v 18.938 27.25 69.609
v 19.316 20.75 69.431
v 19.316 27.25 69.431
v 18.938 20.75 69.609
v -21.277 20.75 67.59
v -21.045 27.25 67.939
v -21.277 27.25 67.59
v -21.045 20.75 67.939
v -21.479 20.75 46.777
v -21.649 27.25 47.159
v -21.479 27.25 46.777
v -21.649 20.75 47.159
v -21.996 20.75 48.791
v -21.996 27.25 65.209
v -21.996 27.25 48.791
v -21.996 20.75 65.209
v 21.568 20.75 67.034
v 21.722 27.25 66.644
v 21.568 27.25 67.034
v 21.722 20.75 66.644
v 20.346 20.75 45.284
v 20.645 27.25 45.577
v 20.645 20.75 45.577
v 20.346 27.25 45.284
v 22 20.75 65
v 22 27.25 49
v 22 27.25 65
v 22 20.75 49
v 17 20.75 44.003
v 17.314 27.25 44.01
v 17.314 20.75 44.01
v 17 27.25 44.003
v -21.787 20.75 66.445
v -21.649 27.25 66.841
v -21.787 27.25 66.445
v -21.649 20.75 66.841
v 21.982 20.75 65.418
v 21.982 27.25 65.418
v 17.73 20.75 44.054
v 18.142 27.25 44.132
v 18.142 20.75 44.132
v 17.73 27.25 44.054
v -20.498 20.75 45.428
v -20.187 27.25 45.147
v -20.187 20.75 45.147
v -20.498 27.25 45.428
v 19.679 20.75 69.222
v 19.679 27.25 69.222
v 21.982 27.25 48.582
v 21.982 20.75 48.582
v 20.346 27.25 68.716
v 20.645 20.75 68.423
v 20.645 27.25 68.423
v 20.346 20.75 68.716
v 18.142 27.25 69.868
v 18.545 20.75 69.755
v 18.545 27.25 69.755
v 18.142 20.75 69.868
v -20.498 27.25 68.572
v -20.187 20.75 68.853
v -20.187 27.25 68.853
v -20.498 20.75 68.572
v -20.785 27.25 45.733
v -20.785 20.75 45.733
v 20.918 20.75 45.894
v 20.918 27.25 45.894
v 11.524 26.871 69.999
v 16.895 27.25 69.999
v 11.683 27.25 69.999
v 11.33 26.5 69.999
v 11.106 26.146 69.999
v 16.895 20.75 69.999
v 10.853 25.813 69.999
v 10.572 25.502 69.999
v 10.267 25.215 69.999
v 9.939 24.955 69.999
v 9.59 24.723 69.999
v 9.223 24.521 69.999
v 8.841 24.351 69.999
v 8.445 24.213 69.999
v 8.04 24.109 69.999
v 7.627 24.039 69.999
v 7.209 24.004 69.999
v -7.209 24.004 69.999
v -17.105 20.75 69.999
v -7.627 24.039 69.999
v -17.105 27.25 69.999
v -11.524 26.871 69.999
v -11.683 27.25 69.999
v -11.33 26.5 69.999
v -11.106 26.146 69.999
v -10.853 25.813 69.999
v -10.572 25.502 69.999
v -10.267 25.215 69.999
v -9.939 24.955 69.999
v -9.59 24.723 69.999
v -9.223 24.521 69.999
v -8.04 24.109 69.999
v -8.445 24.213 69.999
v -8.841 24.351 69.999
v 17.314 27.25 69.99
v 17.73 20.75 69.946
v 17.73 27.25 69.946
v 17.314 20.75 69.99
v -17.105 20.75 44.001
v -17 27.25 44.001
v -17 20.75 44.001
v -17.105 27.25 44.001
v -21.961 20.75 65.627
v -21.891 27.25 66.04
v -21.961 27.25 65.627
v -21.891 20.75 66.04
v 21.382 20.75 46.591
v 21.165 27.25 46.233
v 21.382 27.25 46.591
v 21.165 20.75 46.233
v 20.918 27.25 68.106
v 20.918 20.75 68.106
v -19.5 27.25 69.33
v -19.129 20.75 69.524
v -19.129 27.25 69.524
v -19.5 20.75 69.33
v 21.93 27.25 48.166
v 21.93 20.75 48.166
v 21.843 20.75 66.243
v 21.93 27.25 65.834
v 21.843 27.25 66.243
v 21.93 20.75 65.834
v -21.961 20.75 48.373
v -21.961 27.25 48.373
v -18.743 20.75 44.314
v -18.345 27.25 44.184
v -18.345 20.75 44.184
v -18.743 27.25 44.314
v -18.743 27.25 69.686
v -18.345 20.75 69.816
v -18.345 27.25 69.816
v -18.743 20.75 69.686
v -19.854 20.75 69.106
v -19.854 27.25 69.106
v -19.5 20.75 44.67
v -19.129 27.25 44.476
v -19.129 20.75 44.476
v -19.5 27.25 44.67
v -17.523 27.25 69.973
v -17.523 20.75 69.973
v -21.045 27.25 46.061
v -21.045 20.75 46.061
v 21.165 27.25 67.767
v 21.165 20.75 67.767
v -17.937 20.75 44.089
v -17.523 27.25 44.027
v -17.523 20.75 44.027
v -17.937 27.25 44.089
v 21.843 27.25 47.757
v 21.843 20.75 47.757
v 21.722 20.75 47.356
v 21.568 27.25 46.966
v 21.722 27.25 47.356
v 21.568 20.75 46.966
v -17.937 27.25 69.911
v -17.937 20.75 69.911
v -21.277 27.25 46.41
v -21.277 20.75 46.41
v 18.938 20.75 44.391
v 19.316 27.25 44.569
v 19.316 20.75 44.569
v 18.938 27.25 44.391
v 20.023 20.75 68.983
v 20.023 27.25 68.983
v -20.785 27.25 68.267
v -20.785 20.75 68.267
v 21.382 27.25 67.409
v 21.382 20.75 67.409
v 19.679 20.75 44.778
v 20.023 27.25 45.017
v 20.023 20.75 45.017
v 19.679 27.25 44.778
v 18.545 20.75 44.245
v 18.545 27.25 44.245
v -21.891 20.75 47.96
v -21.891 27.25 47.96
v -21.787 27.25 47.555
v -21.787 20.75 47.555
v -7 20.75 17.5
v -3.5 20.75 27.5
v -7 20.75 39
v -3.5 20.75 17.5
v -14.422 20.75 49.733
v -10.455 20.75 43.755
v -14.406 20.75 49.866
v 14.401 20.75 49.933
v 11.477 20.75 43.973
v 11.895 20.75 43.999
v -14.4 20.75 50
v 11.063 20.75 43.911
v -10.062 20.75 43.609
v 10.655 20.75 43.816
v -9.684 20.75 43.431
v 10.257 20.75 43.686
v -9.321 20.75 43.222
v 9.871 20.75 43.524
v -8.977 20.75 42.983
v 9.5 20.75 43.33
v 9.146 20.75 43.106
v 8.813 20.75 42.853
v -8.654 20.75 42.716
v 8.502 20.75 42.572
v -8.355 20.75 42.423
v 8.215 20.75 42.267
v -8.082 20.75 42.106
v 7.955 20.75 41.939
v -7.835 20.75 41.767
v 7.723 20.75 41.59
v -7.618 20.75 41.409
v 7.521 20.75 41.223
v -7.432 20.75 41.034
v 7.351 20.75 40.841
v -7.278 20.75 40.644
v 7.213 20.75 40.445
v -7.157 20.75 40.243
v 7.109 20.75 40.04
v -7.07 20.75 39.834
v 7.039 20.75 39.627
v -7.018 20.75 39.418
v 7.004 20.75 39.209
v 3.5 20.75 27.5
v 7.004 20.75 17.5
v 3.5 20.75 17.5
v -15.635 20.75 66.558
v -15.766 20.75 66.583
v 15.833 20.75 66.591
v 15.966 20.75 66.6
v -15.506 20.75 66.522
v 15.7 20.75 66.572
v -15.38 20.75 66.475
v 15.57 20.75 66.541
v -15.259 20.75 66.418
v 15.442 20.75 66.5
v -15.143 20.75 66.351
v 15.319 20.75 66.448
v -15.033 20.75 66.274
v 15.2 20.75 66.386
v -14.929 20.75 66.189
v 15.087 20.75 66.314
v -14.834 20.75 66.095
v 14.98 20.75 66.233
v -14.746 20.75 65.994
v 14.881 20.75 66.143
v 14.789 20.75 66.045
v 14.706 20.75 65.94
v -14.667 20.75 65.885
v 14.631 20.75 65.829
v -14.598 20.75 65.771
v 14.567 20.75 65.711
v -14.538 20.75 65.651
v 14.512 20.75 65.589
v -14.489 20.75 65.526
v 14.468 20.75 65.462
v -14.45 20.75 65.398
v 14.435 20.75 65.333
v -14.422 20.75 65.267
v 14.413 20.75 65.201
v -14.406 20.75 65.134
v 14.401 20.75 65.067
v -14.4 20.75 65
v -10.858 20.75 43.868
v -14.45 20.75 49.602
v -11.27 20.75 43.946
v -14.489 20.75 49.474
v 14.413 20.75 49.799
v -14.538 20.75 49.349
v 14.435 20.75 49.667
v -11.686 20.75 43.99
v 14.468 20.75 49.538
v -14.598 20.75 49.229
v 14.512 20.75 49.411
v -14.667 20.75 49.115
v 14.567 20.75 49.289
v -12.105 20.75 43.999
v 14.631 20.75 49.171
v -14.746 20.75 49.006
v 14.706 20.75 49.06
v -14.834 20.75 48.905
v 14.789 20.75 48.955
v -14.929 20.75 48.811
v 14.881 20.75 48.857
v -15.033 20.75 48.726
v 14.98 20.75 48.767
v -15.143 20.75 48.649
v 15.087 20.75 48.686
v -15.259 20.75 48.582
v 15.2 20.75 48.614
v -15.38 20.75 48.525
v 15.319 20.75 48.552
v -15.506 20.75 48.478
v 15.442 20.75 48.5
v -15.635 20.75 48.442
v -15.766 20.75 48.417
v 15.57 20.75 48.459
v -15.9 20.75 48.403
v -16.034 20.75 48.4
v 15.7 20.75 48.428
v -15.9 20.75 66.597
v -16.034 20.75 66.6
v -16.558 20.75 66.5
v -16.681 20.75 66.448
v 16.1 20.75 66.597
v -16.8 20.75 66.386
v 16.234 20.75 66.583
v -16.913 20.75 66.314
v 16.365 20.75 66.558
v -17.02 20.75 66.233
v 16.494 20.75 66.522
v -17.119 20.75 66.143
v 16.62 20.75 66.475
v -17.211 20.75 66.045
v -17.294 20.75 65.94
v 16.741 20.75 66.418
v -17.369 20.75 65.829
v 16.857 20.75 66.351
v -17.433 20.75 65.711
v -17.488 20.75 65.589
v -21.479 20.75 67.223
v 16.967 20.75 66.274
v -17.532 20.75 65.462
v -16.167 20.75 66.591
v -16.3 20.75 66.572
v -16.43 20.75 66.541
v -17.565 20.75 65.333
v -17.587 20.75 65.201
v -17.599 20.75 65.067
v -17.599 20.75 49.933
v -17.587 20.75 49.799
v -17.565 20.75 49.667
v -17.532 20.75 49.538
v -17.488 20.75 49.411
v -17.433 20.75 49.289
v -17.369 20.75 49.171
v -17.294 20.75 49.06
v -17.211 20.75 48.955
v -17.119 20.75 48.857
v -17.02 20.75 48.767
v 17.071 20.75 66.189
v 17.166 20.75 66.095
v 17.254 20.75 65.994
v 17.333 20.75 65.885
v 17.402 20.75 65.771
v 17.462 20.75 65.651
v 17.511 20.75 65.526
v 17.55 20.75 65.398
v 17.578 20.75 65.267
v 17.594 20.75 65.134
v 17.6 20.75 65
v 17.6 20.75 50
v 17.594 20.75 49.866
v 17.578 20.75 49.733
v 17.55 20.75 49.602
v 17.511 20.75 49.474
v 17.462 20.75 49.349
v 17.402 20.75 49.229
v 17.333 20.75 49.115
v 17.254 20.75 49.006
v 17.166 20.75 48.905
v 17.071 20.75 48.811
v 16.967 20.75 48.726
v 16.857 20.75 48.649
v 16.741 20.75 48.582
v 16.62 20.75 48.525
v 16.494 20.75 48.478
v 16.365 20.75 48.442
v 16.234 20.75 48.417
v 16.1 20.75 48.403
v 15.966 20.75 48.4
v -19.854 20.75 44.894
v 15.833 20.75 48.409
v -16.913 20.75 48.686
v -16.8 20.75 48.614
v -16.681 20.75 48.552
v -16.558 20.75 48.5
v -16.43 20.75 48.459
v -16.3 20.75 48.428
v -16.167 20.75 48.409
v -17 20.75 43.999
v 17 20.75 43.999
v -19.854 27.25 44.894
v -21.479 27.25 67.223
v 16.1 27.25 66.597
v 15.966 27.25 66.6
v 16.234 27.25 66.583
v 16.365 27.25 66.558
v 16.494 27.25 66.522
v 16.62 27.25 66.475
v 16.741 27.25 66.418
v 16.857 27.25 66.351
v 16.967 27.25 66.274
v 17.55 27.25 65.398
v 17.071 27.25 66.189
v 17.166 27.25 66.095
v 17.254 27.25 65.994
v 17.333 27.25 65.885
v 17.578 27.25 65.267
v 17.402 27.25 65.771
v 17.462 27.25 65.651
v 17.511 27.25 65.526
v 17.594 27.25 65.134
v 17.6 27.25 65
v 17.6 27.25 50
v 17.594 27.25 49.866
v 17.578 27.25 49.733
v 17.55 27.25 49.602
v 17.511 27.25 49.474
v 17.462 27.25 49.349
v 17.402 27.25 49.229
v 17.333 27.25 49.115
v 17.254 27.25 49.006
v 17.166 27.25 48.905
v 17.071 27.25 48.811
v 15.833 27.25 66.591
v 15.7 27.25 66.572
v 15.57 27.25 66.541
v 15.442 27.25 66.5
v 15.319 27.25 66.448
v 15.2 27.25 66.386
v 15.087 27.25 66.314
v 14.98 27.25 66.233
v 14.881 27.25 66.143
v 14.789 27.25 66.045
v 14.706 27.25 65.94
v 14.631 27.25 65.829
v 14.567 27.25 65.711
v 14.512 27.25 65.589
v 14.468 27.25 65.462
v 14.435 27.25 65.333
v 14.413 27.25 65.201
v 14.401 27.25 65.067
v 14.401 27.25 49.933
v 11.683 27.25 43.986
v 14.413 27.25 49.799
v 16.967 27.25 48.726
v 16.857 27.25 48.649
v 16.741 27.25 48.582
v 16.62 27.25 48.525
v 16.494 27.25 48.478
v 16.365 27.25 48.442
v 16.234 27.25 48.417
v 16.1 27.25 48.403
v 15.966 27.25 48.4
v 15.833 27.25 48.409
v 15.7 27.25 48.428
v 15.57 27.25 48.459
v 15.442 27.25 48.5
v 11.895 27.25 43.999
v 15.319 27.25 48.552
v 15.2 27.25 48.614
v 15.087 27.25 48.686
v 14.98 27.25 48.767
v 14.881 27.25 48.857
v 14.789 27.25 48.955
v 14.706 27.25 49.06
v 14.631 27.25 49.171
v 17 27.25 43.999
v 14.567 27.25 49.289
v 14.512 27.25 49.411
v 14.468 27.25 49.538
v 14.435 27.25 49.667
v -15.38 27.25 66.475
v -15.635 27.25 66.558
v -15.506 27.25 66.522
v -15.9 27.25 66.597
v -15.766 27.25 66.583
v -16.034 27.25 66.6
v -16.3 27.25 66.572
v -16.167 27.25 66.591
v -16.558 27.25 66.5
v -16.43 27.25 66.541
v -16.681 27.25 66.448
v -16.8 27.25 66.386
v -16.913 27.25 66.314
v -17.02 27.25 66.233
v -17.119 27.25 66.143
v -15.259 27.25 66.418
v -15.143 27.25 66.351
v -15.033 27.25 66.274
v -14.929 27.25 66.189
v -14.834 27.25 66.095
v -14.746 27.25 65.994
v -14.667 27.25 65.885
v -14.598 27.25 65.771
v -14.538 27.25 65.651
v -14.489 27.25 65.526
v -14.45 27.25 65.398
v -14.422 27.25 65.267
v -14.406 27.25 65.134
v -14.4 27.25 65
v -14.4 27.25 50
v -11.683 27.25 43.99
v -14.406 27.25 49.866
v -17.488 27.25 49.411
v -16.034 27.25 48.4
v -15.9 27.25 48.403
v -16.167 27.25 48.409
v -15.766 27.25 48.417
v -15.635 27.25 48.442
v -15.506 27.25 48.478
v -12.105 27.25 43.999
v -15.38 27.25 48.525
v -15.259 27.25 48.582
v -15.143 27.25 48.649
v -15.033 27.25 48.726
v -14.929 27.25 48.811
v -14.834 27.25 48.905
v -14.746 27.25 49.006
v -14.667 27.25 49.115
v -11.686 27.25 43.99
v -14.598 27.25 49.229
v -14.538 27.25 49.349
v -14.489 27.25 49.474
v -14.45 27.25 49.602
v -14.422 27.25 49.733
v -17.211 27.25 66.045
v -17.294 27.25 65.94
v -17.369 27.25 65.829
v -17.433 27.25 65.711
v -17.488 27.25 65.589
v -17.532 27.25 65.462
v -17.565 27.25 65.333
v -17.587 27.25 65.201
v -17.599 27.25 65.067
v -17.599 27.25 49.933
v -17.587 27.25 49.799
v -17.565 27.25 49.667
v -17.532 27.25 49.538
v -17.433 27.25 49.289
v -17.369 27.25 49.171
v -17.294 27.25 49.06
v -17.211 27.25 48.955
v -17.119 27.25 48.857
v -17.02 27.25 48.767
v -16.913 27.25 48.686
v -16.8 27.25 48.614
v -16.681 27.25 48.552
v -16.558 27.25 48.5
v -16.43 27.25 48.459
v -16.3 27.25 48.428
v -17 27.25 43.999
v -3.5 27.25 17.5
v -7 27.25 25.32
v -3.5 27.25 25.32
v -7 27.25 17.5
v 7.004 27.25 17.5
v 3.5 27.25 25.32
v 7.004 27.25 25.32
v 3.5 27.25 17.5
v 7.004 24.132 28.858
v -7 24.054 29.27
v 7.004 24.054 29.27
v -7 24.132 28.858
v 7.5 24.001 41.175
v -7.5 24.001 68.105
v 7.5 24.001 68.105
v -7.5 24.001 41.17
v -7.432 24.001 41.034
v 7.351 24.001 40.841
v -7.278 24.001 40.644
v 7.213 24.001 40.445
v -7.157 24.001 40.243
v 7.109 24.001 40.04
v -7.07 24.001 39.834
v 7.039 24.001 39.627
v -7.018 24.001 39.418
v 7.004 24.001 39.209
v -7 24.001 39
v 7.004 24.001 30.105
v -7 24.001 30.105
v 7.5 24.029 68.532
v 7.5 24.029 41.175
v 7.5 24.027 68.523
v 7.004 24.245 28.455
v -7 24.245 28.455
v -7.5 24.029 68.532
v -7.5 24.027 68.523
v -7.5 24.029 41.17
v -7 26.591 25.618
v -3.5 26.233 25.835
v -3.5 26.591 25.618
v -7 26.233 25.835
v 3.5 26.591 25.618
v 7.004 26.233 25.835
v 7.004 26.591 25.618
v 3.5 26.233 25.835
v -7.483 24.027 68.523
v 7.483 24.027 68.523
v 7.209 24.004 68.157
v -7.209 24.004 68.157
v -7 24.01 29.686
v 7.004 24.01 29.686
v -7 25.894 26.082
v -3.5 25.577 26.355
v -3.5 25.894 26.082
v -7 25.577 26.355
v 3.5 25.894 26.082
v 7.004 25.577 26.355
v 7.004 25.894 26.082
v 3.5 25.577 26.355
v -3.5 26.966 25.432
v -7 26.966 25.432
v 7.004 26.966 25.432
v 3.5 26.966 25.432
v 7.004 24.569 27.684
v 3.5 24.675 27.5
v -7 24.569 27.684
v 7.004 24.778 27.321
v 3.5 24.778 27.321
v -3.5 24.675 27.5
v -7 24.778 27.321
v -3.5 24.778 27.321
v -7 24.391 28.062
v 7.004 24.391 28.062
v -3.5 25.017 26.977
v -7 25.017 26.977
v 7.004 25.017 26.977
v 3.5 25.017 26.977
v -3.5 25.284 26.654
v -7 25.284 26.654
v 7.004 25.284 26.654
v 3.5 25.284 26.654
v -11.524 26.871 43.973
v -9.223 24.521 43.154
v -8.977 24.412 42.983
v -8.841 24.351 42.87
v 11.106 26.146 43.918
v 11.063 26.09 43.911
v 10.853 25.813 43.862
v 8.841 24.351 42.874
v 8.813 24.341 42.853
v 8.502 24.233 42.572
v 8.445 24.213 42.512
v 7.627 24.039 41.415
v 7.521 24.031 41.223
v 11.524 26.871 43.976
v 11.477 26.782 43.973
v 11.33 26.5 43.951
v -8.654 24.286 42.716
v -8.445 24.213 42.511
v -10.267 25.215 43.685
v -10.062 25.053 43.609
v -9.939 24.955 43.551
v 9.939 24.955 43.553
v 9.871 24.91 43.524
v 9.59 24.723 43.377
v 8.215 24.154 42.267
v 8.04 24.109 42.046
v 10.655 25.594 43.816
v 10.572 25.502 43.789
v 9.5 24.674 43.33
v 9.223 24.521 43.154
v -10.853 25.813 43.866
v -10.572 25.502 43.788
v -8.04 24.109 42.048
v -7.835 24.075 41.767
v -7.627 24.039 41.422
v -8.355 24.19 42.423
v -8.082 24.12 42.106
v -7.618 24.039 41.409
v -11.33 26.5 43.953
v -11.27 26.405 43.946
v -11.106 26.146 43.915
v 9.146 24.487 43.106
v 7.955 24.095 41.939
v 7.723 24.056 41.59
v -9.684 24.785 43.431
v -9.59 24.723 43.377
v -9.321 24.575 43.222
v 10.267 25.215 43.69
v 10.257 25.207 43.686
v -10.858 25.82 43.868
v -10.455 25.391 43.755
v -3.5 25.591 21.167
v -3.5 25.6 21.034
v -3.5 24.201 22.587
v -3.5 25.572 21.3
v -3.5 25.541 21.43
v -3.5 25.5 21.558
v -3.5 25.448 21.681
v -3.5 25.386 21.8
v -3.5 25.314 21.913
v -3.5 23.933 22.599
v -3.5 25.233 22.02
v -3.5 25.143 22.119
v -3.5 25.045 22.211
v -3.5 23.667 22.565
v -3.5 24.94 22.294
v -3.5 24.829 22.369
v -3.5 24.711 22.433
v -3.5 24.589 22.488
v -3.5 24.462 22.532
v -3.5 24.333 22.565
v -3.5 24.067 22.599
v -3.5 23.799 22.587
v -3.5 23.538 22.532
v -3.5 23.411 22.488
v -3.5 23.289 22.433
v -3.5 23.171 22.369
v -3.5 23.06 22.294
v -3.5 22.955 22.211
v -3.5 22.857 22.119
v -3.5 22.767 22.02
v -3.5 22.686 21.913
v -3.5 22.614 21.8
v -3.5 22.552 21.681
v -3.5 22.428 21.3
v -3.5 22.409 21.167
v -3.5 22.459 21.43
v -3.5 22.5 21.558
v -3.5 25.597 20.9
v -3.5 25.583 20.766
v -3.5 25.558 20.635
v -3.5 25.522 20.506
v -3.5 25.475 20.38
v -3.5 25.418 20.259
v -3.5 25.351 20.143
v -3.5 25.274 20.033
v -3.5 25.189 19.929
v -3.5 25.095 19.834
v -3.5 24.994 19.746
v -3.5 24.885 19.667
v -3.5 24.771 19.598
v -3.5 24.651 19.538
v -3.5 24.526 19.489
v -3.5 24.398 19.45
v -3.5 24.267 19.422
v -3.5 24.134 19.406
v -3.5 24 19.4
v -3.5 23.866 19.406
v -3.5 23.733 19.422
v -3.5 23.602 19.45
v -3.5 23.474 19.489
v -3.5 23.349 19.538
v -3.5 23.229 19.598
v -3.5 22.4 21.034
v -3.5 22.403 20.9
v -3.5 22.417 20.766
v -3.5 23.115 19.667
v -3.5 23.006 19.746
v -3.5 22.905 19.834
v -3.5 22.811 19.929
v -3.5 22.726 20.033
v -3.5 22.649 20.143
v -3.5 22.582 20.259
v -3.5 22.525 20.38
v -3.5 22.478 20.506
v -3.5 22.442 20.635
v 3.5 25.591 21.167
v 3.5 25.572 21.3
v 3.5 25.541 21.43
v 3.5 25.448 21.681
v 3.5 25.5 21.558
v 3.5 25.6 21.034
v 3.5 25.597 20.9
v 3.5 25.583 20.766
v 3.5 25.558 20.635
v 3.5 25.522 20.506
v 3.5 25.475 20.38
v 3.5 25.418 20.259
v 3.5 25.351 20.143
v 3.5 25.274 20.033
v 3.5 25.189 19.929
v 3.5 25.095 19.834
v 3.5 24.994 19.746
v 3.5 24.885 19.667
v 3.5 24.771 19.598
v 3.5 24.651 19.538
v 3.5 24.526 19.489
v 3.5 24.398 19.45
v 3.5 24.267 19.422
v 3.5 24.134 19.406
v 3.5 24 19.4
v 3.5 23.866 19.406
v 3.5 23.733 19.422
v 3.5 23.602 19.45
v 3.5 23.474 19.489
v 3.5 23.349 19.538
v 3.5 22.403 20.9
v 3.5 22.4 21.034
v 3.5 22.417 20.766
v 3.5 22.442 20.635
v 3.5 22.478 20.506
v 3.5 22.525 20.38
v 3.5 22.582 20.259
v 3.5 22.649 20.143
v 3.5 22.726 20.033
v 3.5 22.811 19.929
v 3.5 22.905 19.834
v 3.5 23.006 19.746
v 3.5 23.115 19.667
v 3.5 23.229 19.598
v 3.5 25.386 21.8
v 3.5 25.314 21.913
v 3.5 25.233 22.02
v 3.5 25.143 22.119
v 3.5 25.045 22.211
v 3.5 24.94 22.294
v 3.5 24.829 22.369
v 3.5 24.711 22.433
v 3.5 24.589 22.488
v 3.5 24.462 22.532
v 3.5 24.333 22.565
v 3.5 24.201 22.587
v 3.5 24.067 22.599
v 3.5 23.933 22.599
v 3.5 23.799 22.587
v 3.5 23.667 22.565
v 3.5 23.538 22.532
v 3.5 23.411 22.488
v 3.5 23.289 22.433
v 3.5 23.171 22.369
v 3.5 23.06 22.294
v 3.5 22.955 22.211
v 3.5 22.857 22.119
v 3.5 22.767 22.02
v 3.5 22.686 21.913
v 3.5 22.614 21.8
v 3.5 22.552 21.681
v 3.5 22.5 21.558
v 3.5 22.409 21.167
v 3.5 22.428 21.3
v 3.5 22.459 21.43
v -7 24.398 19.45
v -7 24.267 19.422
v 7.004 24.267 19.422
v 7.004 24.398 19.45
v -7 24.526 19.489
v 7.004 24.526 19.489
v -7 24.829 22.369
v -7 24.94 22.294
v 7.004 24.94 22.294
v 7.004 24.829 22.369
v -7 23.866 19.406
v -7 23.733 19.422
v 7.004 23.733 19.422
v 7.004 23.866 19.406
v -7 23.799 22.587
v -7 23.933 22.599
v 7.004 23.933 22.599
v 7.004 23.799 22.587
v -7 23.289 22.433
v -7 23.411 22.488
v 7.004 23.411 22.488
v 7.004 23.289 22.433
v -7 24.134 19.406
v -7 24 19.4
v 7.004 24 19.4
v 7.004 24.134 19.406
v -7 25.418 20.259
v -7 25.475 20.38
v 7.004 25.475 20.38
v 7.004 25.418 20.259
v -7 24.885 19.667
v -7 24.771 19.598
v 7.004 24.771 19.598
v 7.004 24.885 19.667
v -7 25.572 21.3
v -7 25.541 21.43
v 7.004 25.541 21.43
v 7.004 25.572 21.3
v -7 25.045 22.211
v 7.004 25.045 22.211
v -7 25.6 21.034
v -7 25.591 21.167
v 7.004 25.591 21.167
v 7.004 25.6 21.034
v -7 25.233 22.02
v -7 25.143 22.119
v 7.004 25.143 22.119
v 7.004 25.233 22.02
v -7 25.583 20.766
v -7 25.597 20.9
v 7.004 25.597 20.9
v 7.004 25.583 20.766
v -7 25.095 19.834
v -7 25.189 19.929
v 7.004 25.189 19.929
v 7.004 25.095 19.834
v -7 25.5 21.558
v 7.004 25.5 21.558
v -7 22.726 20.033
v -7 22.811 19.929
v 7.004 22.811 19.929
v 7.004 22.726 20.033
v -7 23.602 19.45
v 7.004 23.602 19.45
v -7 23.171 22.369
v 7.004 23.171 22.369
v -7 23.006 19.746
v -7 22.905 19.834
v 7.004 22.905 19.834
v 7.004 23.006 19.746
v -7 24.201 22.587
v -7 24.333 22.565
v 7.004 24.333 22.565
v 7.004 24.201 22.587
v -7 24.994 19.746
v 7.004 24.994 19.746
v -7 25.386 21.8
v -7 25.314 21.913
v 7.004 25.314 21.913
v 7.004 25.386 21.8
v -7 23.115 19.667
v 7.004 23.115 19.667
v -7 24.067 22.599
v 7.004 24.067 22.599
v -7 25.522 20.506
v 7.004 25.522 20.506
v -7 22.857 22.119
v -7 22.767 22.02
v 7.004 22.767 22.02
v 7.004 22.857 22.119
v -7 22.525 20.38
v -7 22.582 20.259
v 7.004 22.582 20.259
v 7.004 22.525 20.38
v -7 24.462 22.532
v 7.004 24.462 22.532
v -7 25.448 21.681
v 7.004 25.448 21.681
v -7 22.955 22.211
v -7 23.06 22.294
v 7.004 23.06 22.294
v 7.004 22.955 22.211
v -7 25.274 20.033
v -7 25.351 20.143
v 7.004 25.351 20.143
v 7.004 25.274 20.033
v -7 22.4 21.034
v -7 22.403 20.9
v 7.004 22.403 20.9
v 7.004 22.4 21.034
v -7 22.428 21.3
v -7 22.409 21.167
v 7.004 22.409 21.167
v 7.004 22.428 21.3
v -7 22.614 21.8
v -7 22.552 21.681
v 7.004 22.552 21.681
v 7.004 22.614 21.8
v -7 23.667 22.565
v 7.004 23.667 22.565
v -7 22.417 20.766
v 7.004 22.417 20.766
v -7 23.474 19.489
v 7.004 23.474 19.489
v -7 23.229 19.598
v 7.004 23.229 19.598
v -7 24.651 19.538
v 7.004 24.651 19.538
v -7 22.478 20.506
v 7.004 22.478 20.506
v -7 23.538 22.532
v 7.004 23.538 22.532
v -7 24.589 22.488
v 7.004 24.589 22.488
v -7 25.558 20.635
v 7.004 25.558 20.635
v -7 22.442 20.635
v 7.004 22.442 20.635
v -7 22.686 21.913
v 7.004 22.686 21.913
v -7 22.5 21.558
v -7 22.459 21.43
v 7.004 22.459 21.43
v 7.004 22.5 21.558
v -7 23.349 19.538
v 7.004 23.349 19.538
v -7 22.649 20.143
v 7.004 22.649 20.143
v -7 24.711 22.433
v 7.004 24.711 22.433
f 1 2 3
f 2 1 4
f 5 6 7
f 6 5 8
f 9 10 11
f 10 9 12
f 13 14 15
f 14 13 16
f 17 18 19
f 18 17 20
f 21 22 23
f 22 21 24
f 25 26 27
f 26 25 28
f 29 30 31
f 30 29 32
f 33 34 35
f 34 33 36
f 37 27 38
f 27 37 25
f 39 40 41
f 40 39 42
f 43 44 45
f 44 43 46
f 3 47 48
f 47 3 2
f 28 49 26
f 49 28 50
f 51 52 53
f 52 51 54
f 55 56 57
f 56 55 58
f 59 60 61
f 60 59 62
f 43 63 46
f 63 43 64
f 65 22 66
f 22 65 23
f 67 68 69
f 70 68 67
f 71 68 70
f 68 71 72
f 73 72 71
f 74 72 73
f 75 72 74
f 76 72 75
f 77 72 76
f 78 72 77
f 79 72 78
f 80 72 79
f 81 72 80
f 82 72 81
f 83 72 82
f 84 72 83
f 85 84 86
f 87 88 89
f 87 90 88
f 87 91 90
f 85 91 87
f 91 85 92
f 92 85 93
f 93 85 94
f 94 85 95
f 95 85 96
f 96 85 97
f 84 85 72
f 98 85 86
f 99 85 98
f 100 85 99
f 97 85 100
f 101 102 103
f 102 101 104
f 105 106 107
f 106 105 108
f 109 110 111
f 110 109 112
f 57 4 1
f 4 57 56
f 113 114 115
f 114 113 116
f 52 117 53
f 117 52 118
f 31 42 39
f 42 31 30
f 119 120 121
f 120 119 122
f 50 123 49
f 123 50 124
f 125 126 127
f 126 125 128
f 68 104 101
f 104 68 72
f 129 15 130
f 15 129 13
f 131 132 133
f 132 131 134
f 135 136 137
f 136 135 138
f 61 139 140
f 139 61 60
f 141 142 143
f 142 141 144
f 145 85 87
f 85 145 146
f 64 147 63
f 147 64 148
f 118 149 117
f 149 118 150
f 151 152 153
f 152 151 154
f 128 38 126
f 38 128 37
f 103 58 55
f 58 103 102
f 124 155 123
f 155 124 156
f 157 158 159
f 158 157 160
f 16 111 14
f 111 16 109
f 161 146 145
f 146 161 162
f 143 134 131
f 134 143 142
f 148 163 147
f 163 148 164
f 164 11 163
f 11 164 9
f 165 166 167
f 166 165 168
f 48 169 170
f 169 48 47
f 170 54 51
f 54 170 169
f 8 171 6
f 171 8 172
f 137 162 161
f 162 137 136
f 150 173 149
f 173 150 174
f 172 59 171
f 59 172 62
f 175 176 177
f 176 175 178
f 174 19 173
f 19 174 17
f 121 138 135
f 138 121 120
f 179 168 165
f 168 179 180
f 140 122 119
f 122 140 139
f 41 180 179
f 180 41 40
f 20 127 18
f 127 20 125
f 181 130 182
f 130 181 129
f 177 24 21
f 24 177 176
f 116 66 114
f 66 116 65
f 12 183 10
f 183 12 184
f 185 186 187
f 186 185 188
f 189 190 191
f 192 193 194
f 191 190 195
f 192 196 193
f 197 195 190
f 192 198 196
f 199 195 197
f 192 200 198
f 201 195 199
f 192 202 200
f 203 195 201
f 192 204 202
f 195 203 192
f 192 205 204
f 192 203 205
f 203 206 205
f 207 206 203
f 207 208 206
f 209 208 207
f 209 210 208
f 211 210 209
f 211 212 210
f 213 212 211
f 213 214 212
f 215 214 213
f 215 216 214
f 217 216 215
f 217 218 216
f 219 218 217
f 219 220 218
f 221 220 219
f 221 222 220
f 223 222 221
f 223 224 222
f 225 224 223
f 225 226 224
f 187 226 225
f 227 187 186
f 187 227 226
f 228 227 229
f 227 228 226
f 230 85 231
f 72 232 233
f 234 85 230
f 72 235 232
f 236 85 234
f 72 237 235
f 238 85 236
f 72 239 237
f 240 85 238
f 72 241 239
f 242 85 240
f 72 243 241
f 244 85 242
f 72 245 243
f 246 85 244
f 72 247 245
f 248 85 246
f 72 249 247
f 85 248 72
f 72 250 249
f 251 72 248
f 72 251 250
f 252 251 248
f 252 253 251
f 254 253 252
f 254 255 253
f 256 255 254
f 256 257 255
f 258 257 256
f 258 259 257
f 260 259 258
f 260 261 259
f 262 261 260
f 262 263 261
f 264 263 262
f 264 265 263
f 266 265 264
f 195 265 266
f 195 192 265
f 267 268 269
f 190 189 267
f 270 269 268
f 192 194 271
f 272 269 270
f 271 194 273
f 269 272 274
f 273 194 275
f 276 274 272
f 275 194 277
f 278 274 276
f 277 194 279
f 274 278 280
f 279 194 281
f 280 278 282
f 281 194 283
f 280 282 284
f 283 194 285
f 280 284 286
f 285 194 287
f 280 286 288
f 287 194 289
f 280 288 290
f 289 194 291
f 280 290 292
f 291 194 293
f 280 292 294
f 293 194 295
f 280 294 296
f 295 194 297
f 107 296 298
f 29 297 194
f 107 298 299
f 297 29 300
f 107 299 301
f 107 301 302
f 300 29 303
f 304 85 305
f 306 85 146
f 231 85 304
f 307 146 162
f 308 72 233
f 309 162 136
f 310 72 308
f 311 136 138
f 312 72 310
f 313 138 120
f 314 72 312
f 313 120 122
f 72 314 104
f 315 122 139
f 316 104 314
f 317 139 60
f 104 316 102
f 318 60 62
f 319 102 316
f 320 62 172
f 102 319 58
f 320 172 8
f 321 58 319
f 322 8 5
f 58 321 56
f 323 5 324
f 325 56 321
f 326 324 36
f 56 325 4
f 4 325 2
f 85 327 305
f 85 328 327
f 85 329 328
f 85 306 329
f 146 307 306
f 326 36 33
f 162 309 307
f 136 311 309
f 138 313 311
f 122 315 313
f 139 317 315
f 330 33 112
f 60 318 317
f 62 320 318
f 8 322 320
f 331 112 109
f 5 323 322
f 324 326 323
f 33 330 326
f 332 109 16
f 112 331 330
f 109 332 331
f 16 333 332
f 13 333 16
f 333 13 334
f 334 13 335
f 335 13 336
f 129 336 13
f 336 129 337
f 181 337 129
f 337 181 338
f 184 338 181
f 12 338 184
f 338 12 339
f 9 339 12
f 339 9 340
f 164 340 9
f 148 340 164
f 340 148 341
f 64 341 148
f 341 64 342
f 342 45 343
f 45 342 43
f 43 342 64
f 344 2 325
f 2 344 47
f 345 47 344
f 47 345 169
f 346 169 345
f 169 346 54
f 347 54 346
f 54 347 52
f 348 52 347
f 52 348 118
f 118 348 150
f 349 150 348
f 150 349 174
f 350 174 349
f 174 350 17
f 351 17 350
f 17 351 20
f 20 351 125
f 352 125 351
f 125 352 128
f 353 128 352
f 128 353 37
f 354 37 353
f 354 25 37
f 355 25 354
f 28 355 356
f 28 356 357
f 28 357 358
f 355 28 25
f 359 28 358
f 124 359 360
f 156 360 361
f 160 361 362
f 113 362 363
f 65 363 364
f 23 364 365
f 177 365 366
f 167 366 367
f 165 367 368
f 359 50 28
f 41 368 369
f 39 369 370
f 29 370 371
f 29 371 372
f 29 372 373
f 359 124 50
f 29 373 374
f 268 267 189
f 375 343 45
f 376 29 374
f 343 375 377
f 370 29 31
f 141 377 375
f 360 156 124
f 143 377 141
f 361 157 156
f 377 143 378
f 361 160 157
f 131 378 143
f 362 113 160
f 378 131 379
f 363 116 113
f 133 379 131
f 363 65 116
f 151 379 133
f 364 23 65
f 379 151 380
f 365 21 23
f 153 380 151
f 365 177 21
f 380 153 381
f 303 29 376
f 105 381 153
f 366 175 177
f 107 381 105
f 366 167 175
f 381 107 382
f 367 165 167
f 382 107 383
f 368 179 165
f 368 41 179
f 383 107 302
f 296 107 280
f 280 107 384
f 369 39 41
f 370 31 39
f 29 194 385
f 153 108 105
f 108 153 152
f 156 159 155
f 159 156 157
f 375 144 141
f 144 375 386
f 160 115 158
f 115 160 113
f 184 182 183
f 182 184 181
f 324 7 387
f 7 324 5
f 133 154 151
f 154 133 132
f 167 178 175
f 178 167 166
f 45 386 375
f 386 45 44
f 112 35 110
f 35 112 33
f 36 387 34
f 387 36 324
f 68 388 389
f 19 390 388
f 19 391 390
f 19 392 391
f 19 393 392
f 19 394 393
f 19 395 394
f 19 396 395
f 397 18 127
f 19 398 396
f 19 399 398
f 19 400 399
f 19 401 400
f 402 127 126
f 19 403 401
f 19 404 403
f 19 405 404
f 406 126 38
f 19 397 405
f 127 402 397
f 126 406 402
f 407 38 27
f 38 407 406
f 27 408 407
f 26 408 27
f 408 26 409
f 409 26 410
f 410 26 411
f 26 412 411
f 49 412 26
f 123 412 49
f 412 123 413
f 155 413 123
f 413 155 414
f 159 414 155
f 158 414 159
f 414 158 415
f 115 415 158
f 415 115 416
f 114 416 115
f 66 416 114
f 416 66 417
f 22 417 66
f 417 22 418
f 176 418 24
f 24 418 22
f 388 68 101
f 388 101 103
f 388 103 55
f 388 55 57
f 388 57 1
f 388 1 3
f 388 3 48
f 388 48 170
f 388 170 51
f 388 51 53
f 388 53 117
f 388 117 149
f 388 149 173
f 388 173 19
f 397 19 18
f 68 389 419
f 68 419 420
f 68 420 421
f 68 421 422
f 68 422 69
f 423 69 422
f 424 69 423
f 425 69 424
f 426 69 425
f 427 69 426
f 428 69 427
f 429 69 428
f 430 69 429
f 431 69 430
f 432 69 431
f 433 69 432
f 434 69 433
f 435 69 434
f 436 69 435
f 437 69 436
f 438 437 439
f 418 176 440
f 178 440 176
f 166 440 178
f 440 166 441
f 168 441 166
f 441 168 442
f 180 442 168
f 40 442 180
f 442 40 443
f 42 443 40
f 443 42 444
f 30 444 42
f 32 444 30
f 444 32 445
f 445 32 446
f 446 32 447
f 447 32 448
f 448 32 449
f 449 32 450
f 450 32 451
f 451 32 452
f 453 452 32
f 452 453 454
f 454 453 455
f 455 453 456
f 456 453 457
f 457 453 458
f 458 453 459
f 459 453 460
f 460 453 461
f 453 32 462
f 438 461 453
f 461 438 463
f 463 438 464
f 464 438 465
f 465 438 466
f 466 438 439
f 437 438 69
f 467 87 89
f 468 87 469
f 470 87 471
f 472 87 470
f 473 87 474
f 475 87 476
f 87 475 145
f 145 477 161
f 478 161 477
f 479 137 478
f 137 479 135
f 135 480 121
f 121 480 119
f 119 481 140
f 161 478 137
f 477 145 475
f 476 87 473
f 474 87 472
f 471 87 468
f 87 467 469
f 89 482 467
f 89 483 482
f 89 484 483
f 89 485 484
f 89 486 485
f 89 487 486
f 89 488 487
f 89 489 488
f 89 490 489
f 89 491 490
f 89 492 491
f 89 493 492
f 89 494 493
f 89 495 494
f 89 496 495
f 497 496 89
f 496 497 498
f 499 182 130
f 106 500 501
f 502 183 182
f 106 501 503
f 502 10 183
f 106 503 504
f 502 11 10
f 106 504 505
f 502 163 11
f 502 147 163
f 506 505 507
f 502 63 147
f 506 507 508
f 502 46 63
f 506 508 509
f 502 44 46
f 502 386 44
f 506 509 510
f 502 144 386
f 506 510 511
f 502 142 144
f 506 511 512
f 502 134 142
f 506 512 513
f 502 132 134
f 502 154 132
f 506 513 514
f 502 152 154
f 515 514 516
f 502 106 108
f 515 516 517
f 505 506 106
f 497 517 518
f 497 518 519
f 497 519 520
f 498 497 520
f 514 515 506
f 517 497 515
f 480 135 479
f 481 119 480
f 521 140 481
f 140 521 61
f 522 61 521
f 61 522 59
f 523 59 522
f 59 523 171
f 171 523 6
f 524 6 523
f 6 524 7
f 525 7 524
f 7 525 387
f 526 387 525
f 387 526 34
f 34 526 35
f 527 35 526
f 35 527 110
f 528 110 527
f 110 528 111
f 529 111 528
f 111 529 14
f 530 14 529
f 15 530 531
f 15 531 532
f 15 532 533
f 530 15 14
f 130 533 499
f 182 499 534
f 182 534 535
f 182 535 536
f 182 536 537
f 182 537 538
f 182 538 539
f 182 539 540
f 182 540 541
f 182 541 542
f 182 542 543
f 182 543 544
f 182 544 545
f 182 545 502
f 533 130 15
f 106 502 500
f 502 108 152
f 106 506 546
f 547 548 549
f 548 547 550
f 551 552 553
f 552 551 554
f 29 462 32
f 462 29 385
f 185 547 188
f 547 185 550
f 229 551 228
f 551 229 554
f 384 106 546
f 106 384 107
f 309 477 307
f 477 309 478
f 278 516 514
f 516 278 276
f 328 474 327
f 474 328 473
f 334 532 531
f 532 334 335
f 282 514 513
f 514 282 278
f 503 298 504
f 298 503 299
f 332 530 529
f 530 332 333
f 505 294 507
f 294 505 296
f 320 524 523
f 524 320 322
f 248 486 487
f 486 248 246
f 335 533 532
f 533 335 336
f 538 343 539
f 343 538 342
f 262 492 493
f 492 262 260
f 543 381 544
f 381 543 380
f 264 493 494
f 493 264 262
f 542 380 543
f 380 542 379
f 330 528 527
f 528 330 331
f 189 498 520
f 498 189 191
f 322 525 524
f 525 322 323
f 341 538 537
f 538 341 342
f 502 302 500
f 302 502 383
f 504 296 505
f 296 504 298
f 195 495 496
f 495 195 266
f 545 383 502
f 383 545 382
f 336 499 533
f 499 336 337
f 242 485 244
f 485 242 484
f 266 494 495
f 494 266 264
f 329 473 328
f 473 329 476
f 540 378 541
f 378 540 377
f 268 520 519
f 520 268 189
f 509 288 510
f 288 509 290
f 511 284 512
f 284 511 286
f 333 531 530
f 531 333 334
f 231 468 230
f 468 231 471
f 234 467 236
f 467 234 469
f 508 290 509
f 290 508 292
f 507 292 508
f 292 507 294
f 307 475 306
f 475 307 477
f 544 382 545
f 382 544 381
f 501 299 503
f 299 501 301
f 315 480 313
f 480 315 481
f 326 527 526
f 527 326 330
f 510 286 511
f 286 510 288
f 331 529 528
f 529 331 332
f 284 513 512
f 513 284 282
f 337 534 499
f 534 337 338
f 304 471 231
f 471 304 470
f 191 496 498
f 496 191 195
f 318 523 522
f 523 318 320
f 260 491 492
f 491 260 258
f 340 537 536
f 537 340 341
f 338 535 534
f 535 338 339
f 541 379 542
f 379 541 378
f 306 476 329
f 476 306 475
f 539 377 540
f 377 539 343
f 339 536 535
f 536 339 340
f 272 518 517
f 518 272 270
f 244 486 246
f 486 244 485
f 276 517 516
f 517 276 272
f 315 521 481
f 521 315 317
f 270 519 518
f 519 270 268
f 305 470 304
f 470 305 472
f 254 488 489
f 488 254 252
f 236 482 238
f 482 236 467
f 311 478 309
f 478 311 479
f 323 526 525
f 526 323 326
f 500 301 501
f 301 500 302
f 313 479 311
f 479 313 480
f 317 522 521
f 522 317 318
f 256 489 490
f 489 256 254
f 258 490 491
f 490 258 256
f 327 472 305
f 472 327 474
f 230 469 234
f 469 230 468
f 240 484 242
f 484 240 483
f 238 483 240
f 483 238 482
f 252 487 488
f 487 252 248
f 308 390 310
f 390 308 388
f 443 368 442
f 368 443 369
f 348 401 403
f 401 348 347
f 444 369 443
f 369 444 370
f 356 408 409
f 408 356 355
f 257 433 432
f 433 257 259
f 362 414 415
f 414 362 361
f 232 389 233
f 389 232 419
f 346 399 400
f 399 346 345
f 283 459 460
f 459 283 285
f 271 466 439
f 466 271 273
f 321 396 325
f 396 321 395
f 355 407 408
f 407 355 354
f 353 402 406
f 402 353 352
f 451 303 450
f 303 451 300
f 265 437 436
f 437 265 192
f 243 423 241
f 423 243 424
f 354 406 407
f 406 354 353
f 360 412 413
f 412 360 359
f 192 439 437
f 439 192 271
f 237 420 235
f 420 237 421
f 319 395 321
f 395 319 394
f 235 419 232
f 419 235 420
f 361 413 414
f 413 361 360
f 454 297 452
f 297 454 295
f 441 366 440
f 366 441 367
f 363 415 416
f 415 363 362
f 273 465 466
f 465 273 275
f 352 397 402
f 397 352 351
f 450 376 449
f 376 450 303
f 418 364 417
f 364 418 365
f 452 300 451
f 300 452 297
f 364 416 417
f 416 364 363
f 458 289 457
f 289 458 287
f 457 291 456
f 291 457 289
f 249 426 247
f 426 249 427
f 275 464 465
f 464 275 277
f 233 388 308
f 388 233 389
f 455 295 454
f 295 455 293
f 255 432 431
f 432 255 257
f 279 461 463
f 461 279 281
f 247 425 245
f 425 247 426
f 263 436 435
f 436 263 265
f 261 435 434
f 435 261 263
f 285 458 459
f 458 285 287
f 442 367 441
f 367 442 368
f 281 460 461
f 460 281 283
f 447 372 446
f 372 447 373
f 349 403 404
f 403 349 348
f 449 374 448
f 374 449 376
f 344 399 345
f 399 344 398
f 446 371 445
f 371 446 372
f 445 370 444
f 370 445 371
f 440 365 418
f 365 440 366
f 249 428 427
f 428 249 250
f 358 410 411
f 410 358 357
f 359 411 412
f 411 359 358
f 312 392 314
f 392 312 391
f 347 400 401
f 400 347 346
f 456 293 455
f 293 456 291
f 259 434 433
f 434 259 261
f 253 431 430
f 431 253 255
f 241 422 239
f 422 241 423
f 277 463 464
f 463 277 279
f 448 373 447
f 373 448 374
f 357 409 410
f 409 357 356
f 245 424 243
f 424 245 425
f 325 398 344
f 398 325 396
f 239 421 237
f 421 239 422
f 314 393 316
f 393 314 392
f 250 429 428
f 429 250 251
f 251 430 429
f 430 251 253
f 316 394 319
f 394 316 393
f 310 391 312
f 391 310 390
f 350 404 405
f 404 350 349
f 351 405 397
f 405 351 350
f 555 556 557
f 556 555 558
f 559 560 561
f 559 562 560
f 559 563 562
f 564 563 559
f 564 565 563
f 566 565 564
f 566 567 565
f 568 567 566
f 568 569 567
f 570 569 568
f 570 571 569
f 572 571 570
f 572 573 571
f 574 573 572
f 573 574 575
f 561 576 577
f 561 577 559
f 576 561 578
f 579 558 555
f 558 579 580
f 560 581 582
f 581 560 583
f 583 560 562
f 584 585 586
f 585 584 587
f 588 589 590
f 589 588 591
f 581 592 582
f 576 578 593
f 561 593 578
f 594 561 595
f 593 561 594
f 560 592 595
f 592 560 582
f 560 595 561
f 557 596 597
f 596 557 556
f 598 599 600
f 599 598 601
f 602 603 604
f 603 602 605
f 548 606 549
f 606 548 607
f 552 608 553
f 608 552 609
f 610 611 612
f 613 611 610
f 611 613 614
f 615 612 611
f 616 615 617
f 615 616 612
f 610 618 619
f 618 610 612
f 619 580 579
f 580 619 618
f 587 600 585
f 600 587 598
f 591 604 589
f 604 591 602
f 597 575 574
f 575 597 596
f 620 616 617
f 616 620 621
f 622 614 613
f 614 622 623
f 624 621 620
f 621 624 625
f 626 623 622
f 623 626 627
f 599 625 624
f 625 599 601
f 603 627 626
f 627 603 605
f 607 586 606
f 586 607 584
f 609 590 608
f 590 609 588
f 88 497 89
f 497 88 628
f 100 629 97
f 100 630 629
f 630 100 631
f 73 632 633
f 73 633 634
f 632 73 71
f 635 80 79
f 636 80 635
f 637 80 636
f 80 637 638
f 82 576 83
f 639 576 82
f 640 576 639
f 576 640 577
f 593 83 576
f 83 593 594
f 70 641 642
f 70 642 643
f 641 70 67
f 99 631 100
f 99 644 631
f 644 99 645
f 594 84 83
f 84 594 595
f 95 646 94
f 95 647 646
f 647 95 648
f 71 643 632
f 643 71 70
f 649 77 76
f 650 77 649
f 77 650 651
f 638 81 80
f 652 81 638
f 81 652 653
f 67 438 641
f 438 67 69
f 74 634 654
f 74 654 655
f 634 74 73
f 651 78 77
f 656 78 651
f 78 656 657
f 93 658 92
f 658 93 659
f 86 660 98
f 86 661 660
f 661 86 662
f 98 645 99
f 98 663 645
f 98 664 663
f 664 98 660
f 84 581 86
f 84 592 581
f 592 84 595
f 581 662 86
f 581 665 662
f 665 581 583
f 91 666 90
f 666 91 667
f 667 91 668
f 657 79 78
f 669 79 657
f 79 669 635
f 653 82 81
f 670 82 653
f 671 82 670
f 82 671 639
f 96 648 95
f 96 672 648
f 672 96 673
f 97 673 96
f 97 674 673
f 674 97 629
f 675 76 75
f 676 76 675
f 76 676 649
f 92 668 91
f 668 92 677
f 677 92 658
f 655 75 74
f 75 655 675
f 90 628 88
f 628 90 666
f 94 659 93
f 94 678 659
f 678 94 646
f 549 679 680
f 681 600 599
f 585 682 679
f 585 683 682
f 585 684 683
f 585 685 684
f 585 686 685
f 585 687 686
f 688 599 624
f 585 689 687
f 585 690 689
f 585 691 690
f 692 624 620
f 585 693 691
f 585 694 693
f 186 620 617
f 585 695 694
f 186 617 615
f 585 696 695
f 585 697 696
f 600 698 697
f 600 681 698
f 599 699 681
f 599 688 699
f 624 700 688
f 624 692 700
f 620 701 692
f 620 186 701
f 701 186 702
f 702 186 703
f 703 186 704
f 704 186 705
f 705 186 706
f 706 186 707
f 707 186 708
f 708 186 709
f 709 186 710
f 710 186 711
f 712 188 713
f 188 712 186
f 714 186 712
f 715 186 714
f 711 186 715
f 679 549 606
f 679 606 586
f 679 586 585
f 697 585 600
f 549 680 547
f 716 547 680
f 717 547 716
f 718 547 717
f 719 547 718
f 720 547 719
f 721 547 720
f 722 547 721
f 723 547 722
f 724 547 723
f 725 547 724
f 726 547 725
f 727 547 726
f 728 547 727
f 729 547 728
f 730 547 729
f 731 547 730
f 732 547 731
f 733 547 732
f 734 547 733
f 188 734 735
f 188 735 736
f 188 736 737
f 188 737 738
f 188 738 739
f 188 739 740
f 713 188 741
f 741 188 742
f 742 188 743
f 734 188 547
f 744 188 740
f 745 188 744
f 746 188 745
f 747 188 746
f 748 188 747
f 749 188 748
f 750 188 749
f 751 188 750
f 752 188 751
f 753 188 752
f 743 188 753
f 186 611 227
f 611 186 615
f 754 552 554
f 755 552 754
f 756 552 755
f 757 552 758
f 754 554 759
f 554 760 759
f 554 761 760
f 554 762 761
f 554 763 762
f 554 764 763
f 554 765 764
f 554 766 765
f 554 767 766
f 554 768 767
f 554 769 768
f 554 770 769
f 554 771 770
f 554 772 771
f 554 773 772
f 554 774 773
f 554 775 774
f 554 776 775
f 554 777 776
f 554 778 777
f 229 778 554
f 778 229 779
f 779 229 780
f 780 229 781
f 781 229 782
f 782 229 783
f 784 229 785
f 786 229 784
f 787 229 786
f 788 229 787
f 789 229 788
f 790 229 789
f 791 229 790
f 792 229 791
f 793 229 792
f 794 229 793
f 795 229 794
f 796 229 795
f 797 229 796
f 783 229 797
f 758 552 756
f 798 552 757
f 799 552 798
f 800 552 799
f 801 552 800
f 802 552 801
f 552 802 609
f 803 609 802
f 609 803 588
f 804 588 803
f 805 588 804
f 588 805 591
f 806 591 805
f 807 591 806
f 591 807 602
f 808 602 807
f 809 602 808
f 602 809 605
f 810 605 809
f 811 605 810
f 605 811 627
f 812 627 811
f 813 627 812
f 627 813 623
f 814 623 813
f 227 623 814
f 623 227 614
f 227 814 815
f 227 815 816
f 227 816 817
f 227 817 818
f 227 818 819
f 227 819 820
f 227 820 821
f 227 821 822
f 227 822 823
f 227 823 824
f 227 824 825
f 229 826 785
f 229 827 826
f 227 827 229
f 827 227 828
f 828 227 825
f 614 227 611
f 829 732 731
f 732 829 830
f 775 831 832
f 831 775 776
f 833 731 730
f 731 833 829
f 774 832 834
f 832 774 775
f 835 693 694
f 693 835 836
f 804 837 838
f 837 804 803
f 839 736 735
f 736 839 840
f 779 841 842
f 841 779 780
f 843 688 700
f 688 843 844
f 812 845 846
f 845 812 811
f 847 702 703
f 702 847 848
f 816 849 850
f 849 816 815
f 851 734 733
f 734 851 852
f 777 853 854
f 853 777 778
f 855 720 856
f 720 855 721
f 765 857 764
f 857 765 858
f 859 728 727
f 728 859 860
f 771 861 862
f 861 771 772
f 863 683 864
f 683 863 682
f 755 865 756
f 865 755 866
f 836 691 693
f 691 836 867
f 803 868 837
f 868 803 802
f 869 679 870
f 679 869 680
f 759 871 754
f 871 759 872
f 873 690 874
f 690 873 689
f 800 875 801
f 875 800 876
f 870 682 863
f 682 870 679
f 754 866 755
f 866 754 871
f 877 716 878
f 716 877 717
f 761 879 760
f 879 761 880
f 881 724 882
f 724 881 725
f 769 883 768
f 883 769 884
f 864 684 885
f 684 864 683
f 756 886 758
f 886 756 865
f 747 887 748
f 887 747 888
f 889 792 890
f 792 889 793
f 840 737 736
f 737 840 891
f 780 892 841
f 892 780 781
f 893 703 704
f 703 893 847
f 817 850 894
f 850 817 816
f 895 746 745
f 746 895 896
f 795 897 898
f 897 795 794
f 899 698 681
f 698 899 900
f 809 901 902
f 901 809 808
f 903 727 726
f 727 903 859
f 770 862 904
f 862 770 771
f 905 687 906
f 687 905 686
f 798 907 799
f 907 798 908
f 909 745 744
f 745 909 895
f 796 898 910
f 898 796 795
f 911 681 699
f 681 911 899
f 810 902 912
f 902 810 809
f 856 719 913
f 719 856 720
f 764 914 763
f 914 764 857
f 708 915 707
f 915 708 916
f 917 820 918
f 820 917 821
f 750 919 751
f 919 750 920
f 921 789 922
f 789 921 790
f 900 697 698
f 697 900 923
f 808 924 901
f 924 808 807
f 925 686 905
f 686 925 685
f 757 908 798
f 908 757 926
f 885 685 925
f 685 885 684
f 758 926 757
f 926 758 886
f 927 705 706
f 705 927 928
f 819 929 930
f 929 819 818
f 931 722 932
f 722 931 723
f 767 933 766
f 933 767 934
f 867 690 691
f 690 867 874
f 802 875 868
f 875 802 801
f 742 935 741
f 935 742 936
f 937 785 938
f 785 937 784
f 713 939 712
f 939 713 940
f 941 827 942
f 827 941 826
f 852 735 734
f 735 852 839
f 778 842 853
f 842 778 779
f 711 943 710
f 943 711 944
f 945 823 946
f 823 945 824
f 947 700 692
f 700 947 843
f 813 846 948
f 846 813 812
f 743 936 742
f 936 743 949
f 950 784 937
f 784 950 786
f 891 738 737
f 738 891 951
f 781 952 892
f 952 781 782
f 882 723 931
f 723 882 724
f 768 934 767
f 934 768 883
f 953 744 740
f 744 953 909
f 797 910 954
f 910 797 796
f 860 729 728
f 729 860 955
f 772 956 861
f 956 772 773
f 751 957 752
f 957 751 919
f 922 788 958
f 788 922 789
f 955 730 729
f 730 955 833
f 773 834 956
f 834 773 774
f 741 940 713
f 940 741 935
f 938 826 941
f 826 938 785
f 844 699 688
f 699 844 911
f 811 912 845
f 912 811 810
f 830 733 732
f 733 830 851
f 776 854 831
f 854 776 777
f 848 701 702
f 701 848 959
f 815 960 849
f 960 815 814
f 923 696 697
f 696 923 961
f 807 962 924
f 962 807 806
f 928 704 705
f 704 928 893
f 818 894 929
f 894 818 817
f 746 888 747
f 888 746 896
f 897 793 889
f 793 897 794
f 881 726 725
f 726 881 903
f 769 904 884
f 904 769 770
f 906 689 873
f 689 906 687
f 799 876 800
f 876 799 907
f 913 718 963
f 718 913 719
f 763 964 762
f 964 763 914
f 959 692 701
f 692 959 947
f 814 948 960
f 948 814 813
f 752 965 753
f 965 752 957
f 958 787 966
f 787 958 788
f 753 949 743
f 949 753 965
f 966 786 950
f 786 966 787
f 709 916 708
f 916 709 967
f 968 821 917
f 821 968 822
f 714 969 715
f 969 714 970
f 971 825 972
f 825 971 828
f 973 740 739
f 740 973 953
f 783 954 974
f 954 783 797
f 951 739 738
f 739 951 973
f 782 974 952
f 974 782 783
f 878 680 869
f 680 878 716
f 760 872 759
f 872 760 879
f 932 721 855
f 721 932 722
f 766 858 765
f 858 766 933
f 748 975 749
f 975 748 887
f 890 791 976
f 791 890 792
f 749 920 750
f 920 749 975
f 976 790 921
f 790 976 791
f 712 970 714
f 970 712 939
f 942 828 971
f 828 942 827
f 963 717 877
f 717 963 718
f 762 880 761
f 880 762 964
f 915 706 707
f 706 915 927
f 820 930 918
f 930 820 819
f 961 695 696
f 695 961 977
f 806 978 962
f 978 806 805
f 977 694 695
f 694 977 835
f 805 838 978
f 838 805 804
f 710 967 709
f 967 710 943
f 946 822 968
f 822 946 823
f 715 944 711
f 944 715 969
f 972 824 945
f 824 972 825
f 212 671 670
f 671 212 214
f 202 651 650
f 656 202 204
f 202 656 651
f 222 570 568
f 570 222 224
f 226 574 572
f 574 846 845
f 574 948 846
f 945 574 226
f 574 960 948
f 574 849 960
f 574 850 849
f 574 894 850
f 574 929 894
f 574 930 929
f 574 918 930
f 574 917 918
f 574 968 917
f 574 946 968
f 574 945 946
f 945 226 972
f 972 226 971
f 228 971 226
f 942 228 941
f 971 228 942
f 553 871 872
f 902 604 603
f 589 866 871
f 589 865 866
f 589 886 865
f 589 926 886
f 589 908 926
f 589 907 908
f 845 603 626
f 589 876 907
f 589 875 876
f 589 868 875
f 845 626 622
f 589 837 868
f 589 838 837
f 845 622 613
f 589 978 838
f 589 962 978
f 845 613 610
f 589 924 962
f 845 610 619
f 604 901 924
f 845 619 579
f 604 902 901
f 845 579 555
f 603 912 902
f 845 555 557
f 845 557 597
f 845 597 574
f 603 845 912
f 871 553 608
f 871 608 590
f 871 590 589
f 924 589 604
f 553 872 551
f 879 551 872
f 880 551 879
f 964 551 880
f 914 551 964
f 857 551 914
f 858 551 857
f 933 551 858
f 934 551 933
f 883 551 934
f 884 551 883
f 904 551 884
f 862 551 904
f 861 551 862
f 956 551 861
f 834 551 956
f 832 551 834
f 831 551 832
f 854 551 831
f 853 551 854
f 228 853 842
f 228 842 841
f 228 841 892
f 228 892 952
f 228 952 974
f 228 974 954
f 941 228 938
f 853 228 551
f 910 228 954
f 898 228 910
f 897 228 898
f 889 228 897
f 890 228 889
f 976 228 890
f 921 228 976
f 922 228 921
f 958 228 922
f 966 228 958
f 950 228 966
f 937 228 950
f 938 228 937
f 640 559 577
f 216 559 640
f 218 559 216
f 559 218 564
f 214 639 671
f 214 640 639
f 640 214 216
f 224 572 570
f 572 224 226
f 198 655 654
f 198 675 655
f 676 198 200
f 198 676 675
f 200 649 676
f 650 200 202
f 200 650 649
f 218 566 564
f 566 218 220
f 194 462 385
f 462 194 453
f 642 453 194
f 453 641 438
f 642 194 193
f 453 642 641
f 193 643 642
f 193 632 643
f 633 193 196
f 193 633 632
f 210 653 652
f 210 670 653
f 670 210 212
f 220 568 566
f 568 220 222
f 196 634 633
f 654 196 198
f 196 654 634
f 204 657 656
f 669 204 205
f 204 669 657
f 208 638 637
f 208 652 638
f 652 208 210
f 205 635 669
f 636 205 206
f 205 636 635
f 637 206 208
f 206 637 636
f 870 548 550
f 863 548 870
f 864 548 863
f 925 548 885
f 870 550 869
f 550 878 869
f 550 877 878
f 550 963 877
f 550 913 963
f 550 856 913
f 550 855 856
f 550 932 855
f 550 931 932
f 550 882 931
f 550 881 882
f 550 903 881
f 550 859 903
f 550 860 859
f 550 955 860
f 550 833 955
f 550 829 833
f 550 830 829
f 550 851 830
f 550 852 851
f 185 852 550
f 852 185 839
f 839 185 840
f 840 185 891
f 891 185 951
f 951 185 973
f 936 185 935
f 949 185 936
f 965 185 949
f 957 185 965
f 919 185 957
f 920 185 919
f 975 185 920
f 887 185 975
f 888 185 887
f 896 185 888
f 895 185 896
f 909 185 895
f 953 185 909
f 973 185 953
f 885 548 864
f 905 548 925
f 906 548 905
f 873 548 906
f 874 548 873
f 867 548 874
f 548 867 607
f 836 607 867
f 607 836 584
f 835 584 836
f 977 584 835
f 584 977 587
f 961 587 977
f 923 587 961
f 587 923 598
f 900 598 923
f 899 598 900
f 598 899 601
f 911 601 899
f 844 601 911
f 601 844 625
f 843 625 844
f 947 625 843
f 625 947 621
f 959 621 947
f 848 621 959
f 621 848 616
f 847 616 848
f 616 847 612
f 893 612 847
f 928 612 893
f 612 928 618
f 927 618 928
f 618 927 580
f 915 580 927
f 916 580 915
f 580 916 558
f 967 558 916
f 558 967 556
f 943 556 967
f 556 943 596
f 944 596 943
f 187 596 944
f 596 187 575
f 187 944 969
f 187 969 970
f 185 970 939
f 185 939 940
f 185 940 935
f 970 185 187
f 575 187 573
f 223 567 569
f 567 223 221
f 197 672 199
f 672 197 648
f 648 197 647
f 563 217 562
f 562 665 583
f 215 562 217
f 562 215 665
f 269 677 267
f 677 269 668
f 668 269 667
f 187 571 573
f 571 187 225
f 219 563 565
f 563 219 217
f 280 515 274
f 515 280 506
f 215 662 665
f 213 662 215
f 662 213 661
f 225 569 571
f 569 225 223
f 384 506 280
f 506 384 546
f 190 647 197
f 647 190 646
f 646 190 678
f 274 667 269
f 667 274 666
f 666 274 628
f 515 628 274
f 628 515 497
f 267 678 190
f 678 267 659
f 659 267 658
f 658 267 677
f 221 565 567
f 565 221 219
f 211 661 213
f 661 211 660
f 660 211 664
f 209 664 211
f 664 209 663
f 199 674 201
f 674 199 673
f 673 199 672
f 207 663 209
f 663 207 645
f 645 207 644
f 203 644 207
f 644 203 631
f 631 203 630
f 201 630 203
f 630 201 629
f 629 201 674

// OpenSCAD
$fn=75;
$m3_hole=3.2;

module air_holes() {
  for (s = [0 : 22.5 : 360])
    rotate([0, 0, s]) translate([0, 0, -8]) rotate([75, 0, 0])
      cylinder(d=2.2, h=26);
}

module shroud_torus() {
  // inner inverted circle ring cutout
  difference() {
    rotate_extrude() translate([16, -3, 0]) square([10, 3]);
    rotate_extrude() translate([17, 0, 0]) circle(d=6.6);
  }
  // Outer ring
  rotate_extrude() translate([26, 0, 0]) hull() {
    circle(d=6); translate([-3, 0, 0]) circle(d=6);
  }
}

module fan_attachment() {
  // inner bit
  $h=12;
  translate([0, 0.7, $h/2-1]) hull() {
    cylinder(d=2, h=$h, center=true);
    translate([15, 11, 0]) cylinder(d=2, h=$h, center=true);
    translate([15, 0, 0]) cylinder(d=2, h=$h, center=true);
    translate([0, 11, 0]) cylinder(d=2, h=$h, center=true);
  }
  // outer bit
  translate([0, 0.7, $h/2-8]) hull() {
    cylinder(d=6, h=$h, center=true);
    translate([16, 11, 0]) cube([6, 6, $h], center=true);
    translate([16, 0, 0]) cube([6, 6, $h], center=true);
    translate([0, 11, 0]) cylinder(d=6, h=$h, center=true);
  }
  // base joint to shroud
  translate([0, -8.7, -8.0]) hull() {
    translate([0, -1, 0]) sphere(d=6, center=true);
    translate([25, 20.4, 0]) sphere(d=6, center=true);
    translate([25, 5, 0]) sphere(d=6, center=true);
    translate([0, 20.4, 0]) sphere(d=6, center=true);
  }
}


module shroud_attachment($diff) {
  if ($diff) {
    difference() {
      hull() {
        cube([6.5, 6.5, 18], center=true);
        translate([0, 0, 12]) rotate([0, 90, 0]) cylinder(d=6.5, h=6.5, center=true);
      }
      translate([0, 0, -3]) rotate([0, 90, 0]) cylinder(d=$m3_hole, h=40, center=true);
      translate([0, 0, 12]) rotate([0, 90, 0]) cylinder(d=$m3_hole, h=40, center=true);
    }
  }
  else {
    hull() {
      cube([7, 7, 18], center=true);
      translate([0, 0, 15]) cube([7, 7, 7], center=true);
    }
    translate([0, 0, -3]) rotate([0, 90, 0]) cylinder(d=$m3_hole, h=40, center=true);
    translate([0, 0, 12]) rotate([0, 90, 0]) cylinder(d=$m3_hole, h=40, center=true);
  }
}

module shroud() {
  shroud_torus();

  // scaffolding attachment
  translate([0, 24, 9])
    shroud_attachment(true);


  translate([-17, 29.5, 8]) {
    fan_attachment();
  }

  // zprobe
  translate([2, 27.2, -3]) z_probe_attachment();
}

module z_probe_attachment() {
  difference() {
    cube([21.4, 25, 15]);
    // m3 clamp holes
    translate([0, 21.5, 3]) rotate([0, 90, 0]) cylinder(d=$m3_hole, h=22);
    translate([0, 21.5, 11]) rotate([0, 90, 0]) cylinder(d=$m3_hole, h=22);
    translate([2, 2, -1]) cube([17.4, 25, 17]);
  }
}

module hotend_shroud() {
  difference() {
    shroud();

    // internal ring void
    rotate_extrude() translate([26, 0, 0]) hull() {
      circle(d=4.8); translate([-3, 0, 0]) circle(d=4.8);
    }

    air_holes();

    // fan attachment joint void
    translate([-17, 22.5, 0]) hull() {
      rotate([0, 90, 0]) cylinder(d=4, h=15);
      translate([0, 10, 0]) rotate([0, 90, 0]) cylinder(d=4, h=15);
    }

    // fan inlet void
    translate([-17, 30.2, -2]) cube([15, 11, 60]);

    // cleanup excess shroud void for z probe
    translate([4, 29, -3]) cube([17.4, 25, 30]);
  }

  // air fins
  translate([-4, 26.5, -3]) rotate([0, 0, 30]) cube([.8, 4, 5.8]);
  translate([-8.5, 25.3, -3]) rotate([0, 0, 15]) cube([.8, 5, 5.8]);
  translate([-14.5, 23.4, -3]) rotate([0, 0, -10]) cube([.8, 7, 5.8]);
}

module rounded_cube($x, $y, $z, $r) {
    hull() {
        translate ([0,  0,  0]) rotate([90, 0, 0]) cylinder(r=$r, h=$y);
        translate ([0,  0, $z]) rotate([90, 0, 0]) cylinder(r=$r, h=$y);
        translate ([$x, 0, $z]) rotate([90, 0, 0]) cylinder(r=$r, h=$y);
        translate ([$x, 0,  0]) rotate([90, 0, 0]) cylinder(r=$r, h=$y);
    }
}

module scaffolding_base() {
    translate([-17, 3.25, 14]) rounded_cube(34, 6.5, 16, 5);
    translate([0, 0, -4]) cube([34, 6.5, 27], center=true);
}

module hotend_attachment_e3dv6() {
  // scaffolding attachment
  translate([0, 24, 9]) {
    difference() {
      difference() {
        translate([0, 0, 26]) {
          // main body
          difference() {
            scaffolding_base();

            // head attachment slits
            translate([-16, 0, 15]) hull() {
              rotate([90, 0, 0]) cylinder(d=$m3_hole, h=10, center=true);
              translate([0, 0, 15])
                rotate([90, 0, 0]) cylinder(d=$m3_hole, h=10, center=true);
            }
            translate([16, 0, 15]) hull() {
              rotate([90, 0, 0]) cylinder(d=$m3_hole, h=10, center=true);
              translate([0, 0, 15])
                rotate([90, 0, 0]) cylinder(d=$m3_hole, h=10, center=true);
            }

            // shave out excess width
            translate([-7.5, 5, 33]) rotate([0, 90, 90]) rounded_cube(38, 15, 10, 5);
            translate([-7, 5, 38]) rotate([90, 0, 90]) rounded_cube(5, 36, 14, 5);
          }
        }

        shroud_attachment(false);
      }

      // shroud attachment cutouts
      translate([12, 5, -10]) rounded_cube(10, 10, 40, 5);
      translate([-22, 5,-10]) rounded_cube(10, 10, 40, 5);
    }
  }
}

module hotend_attachment_sunhokey() {
  // scaffolding attachment
  translate([0, 24, 9]) {
    difference() {
      difference() {
        translate([0, 0, 26]) {

          difference() {
            translate([-5.5, 0, 8])
              union() {
                  // main body
                  cube([51, 6.5, 60], center=true);

                  // fan arm
                  translate([-20-3.25, -25+3.25, 20])
                      cube([6.5, 50, 20], center=true);
              }

            // head attachment slits
            translate([-16, 0, 15]) hull() {
              rotate([90, 0, 0]) cylinder(d=$m3_hole, h=10, center=true);
              translate([0, 0, 15])
                rotate([90, 0, 0]) cylinder(d=$m3_hole, h=10, center=true);
            }

            translate([16, 0, 15]) hull() {
              rotate([90, 0, 0]) cylinder(d=$m3_hole, h=10, center=true);
              translate([0, 0, 15])
                rotate([90, 0, 0]) cylinder(d=$m3_hole, h=10, center=true);
            }
            // head attachment slits - end

            // fan attachment slits
            translate([-28.25, -23.25, 8])
            rotate([0, 0, 90]) {
                translate([-16, 0, 15]) hull() {
                  rotate([90, 0, 0]) cylinder(d=$m3_hole, h=10, center=true);
                  translate([0, 0, 10])
                    rotate([90, 0, 0]) cylinder(d=$m3_hole, h=10, center=true);
                }

                translate([16, 0, 15]) hull() {
                  rotate([90, 0, 0]) cylinder(d=$m3_hole, h=10, center=true);
                  translate([0, 0, 10])
                    rotate([90, 0, 0]) cylinder(d=$m3_hole, h=10, center=true);
                }
            }
            // fan attachment slits - end
          }
        }

        shroud_attachment(false);
      }
      translate([15, 0, 11])
        cube([10, 10, 40], center=true);
      translate([-15-5.5, 0, 11])
        cube([10+11, 10, 40], center=true);
    }
  }
}

// hotend_shroud();
hotend_attachment_e3dv6();
// hotend_attachment_sunhokey();
